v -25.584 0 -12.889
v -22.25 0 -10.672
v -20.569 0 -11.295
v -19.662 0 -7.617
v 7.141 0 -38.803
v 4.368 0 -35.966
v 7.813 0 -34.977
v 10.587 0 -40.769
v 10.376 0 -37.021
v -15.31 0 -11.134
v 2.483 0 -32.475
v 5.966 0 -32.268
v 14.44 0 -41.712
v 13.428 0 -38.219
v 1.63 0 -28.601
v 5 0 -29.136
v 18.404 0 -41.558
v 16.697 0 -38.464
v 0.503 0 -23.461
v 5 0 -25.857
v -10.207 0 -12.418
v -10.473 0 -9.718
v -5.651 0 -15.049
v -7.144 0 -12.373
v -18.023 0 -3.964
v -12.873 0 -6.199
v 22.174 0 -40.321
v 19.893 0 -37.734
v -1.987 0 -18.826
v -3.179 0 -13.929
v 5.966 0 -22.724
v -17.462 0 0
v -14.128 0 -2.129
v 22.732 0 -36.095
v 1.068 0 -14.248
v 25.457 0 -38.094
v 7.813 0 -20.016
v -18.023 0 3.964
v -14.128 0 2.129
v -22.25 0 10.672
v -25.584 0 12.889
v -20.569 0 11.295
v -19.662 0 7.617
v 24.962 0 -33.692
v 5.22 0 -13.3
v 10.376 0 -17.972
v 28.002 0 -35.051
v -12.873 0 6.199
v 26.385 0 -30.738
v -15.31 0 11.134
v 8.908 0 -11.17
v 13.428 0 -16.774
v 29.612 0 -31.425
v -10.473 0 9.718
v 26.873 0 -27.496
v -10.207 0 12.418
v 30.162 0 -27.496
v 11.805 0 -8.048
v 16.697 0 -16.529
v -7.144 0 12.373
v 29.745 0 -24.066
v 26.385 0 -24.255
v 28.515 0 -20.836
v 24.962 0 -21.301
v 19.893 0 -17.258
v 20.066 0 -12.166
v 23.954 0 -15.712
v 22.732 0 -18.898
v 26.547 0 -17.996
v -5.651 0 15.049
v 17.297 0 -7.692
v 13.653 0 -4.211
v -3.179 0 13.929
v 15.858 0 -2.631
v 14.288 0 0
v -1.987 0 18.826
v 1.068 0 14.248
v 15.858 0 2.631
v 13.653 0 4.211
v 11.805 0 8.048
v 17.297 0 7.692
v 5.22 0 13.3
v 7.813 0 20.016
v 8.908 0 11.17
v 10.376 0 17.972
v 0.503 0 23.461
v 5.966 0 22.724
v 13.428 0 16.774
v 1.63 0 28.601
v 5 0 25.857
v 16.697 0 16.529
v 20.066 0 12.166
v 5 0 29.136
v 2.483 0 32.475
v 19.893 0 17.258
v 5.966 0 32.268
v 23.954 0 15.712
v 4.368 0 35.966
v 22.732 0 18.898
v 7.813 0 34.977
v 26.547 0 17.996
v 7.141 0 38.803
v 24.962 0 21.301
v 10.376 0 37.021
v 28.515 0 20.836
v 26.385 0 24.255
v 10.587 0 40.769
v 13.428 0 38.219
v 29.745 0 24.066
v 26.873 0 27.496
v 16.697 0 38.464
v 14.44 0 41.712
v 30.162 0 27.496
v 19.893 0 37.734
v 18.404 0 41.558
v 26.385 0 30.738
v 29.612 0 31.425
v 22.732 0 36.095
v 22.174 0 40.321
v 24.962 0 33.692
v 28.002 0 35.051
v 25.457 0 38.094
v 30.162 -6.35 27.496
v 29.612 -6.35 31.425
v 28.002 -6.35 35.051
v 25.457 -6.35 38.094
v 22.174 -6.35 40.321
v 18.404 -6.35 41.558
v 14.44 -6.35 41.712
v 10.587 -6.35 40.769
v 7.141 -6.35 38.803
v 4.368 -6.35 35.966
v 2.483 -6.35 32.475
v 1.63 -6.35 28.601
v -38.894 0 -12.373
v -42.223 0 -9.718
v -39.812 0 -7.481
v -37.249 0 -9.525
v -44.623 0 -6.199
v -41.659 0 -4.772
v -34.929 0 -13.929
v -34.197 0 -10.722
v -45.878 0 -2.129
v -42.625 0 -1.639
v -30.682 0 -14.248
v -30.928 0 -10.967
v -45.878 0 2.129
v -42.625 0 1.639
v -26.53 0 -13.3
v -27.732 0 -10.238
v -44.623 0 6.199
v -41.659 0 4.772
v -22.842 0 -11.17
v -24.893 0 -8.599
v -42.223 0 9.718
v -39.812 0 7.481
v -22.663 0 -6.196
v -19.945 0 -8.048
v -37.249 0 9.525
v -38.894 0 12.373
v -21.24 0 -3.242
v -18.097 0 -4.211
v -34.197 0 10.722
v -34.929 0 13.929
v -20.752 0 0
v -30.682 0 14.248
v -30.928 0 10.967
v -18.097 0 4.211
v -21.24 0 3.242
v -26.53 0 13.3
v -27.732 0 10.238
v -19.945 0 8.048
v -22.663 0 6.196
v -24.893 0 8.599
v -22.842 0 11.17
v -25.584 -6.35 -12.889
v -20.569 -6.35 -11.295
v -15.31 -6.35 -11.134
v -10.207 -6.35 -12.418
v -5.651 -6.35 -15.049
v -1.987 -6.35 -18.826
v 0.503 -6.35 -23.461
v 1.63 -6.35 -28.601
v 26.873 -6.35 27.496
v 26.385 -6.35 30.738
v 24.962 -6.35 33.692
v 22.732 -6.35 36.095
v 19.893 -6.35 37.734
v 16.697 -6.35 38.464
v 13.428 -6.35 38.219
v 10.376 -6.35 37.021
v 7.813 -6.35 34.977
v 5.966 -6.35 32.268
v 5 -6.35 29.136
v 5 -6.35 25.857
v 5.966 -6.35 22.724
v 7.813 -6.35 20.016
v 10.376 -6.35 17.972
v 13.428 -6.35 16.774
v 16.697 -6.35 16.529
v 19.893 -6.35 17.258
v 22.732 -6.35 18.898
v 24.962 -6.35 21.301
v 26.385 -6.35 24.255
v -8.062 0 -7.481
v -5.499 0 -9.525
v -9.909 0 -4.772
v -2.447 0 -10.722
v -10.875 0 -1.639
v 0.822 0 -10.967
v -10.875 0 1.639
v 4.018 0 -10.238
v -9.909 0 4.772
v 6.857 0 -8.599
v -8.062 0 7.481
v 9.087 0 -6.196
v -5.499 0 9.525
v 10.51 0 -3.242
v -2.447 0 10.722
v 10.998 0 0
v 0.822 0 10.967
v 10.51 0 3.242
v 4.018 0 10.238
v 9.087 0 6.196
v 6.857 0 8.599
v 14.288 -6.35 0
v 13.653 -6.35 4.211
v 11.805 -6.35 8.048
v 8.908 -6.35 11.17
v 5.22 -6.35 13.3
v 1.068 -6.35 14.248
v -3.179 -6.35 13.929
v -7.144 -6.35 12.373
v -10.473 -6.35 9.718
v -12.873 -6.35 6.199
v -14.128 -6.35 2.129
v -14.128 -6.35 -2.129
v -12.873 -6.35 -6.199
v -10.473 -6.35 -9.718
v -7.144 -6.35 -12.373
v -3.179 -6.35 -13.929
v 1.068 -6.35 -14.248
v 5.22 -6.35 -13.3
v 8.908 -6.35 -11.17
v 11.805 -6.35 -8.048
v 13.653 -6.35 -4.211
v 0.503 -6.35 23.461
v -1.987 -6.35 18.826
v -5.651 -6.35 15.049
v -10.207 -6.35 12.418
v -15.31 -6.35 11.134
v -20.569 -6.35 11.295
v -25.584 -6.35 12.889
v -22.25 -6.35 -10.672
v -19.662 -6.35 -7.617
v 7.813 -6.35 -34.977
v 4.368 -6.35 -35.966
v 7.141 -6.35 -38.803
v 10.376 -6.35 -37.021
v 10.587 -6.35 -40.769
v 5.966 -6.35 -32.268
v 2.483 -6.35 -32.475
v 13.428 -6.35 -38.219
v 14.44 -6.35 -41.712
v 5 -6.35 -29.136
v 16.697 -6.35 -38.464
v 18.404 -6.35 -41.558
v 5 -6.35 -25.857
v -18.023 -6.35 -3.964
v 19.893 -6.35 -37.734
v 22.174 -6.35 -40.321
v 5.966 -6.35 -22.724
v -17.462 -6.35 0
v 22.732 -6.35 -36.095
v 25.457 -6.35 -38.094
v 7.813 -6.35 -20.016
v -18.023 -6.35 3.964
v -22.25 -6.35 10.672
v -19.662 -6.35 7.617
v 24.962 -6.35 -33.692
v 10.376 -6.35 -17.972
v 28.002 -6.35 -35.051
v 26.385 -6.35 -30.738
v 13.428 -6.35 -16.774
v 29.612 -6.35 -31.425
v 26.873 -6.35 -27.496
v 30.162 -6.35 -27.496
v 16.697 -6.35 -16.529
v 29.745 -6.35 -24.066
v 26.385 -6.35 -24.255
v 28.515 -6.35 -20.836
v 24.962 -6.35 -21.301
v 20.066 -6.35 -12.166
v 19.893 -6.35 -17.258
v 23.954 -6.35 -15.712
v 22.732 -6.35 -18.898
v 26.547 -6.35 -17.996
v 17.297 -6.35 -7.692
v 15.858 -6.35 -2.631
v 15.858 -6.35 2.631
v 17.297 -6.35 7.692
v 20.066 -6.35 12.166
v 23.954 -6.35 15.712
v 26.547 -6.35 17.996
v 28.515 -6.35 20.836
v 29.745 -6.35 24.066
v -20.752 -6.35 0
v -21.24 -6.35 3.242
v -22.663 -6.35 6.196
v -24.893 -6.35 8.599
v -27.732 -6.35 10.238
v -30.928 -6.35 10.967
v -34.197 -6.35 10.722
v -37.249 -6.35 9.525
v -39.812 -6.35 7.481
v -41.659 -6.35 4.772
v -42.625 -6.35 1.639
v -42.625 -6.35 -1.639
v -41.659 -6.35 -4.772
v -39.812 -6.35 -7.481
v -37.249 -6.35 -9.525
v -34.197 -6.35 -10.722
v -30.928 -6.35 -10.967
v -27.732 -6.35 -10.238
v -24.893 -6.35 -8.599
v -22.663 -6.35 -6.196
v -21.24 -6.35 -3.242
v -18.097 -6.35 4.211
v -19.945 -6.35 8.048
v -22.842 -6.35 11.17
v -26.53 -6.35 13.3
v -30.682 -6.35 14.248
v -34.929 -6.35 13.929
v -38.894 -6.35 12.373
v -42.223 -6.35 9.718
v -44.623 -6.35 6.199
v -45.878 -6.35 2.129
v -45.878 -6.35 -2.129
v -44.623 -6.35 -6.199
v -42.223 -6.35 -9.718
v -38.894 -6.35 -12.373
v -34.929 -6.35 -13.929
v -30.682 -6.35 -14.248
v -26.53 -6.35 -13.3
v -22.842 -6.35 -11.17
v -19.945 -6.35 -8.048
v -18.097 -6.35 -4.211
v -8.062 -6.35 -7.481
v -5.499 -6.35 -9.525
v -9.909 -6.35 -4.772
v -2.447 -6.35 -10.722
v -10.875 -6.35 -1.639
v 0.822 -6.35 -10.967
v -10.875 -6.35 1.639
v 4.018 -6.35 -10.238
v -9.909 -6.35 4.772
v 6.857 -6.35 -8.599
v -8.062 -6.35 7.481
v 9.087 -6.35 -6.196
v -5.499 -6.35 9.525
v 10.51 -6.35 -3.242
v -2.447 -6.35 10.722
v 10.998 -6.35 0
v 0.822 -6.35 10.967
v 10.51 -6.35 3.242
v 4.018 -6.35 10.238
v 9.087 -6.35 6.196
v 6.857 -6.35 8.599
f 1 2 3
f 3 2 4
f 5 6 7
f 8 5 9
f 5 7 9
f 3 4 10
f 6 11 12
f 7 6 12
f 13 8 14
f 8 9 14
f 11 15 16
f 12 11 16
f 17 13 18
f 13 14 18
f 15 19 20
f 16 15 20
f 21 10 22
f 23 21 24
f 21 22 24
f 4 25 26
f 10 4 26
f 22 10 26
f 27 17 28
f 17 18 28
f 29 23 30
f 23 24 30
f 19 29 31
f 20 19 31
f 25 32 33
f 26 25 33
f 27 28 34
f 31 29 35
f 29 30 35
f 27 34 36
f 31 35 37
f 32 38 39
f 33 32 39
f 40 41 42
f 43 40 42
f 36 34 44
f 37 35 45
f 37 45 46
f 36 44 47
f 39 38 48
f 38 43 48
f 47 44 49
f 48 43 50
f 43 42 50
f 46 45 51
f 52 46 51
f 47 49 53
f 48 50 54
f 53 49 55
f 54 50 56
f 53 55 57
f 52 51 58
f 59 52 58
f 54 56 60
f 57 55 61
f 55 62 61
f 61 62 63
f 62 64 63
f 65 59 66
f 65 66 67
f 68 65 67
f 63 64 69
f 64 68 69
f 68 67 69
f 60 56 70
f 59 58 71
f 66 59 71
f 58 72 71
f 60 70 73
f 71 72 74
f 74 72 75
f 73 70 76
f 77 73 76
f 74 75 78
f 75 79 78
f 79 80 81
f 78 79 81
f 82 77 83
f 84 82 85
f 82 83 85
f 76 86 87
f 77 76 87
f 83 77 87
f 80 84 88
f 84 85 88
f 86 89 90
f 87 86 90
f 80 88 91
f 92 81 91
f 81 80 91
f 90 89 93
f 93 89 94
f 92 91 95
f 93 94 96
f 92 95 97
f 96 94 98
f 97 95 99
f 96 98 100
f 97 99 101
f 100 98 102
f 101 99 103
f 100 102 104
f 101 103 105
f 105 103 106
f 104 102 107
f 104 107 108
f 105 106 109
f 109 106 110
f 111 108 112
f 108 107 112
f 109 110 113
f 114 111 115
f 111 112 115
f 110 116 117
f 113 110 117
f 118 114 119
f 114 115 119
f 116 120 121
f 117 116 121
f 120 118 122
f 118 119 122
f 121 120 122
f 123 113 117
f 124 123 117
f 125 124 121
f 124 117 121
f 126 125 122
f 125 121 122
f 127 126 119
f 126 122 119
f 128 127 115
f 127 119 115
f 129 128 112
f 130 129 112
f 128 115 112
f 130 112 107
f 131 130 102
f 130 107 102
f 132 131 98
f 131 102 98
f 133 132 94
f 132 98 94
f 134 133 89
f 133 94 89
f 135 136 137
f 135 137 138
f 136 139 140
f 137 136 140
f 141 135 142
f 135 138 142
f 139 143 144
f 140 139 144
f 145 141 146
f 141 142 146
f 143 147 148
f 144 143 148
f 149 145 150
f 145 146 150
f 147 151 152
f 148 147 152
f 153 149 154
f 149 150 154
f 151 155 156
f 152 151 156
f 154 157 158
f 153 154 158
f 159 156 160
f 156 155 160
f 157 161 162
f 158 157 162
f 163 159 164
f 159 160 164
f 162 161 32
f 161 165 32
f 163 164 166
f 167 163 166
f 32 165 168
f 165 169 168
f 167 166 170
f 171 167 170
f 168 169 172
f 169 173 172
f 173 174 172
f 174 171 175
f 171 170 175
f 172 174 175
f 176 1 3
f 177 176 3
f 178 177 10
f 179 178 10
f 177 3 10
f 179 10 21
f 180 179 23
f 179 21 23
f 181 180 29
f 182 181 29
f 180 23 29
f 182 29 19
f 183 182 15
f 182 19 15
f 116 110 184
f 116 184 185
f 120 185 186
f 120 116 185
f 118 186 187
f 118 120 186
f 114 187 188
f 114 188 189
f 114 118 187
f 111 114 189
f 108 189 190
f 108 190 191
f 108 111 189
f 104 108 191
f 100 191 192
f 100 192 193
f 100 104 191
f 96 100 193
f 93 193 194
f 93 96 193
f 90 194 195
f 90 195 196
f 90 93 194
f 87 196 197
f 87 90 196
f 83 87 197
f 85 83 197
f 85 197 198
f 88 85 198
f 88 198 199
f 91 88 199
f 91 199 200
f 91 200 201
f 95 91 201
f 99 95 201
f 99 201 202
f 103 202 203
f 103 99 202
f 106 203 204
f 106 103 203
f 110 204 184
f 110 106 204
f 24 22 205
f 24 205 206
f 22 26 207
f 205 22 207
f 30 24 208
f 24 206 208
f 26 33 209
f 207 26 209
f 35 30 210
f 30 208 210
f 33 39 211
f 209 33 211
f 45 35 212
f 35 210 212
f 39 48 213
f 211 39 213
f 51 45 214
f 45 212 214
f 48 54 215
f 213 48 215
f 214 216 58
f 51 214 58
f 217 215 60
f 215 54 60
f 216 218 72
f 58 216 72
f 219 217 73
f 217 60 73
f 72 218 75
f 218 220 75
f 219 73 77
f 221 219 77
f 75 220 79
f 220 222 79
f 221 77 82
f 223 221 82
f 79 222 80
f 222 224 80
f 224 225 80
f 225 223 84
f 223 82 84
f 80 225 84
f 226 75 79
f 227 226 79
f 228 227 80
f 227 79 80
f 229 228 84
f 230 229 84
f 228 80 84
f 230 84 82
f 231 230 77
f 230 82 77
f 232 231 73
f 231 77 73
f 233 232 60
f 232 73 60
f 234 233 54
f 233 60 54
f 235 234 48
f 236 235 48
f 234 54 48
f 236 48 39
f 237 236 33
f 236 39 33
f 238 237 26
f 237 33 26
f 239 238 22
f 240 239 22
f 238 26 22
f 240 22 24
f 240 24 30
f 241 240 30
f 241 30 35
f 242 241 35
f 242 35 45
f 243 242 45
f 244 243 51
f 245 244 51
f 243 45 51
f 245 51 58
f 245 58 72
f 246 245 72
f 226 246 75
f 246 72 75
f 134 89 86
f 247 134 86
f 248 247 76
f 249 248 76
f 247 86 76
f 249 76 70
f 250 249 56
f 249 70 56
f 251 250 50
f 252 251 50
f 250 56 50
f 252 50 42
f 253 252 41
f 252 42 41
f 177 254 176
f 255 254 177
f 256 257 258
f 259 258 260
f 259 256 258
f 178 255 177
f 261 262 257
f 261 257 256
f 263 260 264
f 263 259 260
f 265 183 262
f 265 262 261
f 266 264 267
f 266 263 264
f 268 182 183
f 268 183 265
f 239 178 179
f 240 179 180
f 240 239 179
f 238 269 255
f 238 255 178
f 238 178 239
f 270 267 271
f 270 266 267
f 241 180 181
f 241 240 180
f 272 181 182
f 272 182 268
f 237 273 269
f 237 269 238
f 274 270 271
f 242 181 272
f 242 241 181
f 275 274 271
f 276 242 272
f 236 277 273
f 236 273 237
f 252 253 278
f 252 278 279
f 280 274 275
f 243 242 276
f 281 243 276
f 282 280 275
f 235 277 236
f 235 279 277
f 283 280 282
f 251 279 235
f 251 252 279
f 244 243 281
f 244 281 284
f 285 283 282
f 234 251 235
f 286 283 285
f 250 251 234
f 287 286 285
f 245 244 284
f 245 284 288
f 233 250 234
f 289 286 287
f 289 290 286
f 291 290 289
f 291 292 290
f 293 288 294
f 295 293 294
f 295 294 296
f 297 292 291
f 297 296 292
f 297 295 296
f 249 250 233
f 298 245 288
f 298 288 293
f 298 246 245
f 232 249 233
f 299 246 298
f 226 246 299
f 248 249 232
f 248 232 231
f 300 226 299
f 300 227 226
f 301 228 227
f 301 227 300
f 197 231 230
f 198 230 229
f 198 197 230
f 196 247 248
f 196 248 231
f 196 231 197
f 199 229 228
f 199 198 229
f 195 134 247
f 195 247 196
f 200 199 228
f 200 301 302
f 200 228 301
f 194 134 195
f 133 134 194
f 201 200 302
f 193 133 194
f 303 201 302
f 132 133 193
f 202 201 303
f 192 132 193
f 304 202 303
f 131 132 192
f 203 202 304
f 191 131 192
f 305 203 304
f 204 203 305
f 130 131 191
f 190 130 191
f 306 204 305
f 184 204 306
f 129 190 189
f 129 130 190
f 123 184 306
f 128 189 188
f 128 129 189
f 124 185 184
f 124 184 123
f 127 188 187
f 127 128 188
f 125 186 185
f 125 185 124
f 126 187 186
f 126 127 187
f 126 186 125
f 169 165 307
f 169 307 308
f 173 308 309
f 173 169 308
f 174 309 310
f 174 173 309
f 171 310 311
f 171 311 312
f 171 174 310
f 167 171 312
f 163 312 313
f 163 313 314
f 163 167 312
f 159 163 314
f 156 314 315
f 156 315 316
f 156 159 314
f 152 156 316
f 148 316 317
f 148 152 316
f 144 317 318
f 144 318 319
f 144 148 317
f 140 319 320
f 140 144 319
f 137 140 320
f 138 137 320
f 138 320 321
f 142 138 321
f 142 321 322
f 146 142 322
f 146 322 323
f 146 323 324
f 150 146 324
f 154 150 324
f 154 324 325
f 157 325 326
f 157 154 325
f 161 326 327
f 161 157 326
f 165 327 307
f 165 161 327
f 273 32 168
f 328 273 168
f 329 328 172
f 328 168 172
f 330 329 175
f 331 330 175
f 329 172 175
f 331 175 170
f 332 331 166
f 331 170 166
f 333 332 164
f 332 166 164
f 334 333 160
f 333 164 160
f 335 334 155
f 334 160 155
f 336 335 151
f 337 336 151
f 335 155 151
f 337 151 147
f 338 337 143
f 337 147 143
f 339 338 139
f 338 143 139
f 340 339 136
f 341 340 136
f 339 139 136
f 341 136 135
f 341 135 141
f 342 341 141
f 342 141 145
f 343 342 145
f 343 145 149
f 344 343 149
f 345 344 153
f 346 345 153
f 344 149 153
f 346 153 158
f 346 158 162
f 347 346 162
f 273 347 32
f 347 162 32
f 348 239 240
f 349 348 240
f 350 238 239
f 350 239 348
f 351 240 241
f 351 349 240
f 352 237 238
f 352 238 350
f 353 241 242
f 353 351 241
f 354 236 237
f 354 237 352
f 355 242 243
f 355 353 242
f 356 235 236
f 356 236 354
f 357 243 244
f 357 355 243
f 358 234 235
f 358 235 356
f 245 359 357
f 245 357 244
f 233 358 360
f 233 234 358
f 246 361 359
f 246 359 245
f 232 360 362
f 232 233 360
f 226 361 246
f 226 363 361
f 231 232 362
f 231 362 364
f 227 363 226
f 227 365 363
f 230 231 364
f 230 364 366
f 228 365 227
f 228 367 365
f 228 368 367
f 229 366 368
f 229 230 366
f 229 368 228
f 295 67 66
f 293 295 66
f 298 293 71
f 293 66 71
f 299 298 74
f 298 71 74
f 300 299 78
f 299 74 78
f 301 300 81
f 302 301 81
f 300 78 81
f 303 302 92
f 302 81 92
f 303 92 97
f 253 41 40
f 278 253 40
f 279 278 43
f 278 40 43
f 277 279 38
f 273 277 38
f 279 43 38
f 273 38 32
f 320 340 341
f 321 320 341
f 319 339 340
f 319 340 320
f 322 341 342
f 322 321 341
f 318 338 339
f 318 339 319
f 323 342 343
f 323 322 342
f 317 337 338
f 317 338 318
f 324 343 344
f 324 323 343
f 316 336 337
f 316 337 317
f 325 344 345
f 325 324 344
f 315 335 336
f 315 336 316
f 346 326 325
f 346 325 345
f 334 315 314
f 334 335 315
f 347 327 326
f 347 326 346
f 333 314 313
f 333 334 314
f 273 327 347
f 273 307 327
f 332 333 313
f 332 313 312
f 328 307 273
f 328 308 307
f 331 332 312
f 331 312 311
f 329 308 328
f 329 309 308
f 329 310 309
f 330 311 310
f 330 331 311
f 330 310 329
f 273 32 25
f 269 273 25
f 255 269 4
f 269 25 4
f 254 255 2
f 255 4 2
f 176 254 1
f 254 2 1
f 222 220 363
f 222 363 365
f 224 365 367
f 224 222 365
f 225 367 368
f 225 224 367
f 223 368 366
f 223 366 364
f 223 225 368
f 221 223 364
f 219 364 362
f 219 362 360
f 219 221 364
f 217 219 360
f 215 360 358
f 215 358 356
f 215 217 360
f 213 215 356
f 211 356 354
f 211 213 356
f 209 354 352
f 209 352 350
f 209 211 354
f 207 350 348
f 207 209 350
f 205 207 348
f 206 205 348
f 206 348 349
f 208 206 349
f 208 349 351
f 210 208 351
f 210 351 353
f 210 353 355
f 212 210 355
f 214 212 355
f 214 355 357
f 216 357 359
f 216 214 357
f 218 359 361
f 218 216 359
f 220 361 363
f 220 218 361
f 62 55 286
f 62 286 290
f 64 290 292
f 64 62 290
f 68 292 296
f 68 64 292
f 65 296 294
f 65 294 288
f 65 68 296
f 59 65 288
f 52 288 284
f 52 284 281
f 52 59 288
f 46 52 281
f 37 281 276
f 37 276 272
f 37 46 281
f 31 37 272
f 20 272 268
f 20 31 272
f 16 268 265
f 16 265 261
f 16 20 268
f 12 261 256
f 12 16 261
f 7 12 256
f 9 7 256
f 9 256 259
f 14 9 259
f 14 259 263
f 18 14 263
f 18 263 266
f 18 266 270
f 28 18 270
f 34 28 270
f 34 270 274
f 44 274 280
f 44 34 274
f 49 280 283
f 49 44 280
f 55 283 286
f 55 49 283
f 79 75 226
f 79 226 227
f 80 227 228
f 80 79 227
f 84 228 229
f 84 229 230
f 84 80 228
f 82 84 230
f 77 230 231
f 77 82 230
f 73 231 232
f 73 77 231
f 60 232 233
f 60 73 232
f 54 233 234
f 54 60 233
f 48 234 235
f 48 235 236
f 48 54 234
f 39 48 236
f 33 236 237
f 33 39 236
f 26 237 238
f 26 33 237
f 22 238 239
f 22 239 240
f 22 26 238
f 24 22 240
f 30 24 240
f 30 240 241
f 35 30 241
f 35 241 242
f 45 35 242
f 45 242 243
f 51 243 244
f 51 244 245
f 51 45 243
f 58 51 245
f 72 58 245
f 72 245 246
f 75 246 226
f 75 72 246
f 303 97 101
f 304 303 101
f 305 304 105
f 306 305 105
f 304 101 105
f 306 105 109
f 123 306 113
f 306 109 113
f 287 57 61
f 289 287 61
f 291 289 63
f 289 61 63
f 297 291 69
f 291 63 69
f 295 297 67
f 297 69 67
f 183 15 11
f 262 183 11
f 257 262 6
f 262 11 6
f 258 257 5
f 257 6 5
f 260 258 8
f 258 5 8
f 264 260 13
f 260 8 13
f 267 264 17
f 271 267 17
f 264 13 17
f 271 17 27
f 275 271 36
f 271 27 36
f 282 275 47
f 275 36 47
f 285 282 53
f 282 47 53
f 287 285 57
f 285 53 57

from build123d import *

# Parameters (mm, degrees)
F1_R     = 10.9982
F1_R_2   = 14.2875
F2_DEPTH = 6.35
F0_R     = 14.2875
F0_R_2   = 10.9982


with BuildPart() as f2:
    # F1 (on Front) → F2 (new body)
    with BuildSketch(Plane.XZ):
        with BuildLine():
            ThreePointArc((30.1625, 27.4963065702), (16.4276008155, 41.7731160383), (1.6302461293, 28.6006812411))
            ThreePointArc((1.6302461293, 28.6006812411), (8.73125, 15.1229686136), (23.9537934556, 15.7121751829))
            ThreePointArc((23.9537934556, 15.7121751829), (28.5153800921, 20.8364681805), (30.1625, 27.4963065702))
        make_face()
        with Locations((15.875, 27.4963065702)):
            Circle(F1_R, mode=Mode.SUBTRACT)
        with BuildLine():
            ThreePointArc((1.6302461293, 28.6006812411), (-7.8377590316, 13.5753968602), (-25.584039585, 12.8885060581))
            ThreePointArc((-25.584039585, 12.8885060581), (-19.6622207234, 7.6169710785), (-17.4625, 0))
            ThreePointArc((-17.4625, 0), (-19.6622207234, -7.6169710785), (-25.584039585, -12.8885060581))
            ThreePointArc((-25.584039585, -12.8885060581), (-7.8377590316, -13.5753968602), (1.6302461293, -28.6006812411))
            ThreePointArc((1.6302461293, -28.6006812411), (8.73125, -15.1229686136), (23.9537934556, -15.7121751829))
            ThreePointArc((23.9537934556, -15.7121751829), (15.6755180632, 0), (23.9537934556, 15.7121751829))
            ThreePointArc((23.9537934556, 15.7121751829), (8.73125, 15.1229686136), (1.6302461293, 28.6006812411))
        make_face()
        Circle(F1_R_2, mode=Mode.SUBTRACT)
        with BuildLine():
            ThreePointArc((23.9537934556, -15.7121751829), (8.73125, -15.1229686136), (1.6302461293, -28.6006812411))
            ThreePointArc((1.6302461293, -28.6006812411), (16.4276008155, -41.7731160383), (30.1625, -27.4963065702))
            ThreePointArc((30.1625, -27.4963065702), (28.5153800921, -20.8364681805), (23.9537934556, -15.7121751829))
        make_face()
        with Locations((15.875, -27.4963065702)):
            Circle(F1_R, mode=Mode.SUBTRACT)
    extrude(amount=F2_DEPTH)


with BuildPart() as f2b:
    # F0 (on Front) → F2, piece 2 (new body)
    with BuildSketch(Plane.XZ):
        Circle(F0_R)
        Circle(F0_R_2, mode=Mode.SUBTRACT)
    extrude(amount=F2_DEPTH)


with BuildPart() as f2c:
    # F0 (on Front) → F2, piece 3 (new body)
    with BuildSketch(Plane.XZ):
        with Locations((-31.75, 0)):
            Circle(F0_R)
        with Locations((-31.75, 0)):
            Circle(F0_R_2, mode=Mode.SUBTRACT)
    extrude(amount=F2_DEPTH)


solid = Compound([f2.part, f2b.part, f2c.part])
